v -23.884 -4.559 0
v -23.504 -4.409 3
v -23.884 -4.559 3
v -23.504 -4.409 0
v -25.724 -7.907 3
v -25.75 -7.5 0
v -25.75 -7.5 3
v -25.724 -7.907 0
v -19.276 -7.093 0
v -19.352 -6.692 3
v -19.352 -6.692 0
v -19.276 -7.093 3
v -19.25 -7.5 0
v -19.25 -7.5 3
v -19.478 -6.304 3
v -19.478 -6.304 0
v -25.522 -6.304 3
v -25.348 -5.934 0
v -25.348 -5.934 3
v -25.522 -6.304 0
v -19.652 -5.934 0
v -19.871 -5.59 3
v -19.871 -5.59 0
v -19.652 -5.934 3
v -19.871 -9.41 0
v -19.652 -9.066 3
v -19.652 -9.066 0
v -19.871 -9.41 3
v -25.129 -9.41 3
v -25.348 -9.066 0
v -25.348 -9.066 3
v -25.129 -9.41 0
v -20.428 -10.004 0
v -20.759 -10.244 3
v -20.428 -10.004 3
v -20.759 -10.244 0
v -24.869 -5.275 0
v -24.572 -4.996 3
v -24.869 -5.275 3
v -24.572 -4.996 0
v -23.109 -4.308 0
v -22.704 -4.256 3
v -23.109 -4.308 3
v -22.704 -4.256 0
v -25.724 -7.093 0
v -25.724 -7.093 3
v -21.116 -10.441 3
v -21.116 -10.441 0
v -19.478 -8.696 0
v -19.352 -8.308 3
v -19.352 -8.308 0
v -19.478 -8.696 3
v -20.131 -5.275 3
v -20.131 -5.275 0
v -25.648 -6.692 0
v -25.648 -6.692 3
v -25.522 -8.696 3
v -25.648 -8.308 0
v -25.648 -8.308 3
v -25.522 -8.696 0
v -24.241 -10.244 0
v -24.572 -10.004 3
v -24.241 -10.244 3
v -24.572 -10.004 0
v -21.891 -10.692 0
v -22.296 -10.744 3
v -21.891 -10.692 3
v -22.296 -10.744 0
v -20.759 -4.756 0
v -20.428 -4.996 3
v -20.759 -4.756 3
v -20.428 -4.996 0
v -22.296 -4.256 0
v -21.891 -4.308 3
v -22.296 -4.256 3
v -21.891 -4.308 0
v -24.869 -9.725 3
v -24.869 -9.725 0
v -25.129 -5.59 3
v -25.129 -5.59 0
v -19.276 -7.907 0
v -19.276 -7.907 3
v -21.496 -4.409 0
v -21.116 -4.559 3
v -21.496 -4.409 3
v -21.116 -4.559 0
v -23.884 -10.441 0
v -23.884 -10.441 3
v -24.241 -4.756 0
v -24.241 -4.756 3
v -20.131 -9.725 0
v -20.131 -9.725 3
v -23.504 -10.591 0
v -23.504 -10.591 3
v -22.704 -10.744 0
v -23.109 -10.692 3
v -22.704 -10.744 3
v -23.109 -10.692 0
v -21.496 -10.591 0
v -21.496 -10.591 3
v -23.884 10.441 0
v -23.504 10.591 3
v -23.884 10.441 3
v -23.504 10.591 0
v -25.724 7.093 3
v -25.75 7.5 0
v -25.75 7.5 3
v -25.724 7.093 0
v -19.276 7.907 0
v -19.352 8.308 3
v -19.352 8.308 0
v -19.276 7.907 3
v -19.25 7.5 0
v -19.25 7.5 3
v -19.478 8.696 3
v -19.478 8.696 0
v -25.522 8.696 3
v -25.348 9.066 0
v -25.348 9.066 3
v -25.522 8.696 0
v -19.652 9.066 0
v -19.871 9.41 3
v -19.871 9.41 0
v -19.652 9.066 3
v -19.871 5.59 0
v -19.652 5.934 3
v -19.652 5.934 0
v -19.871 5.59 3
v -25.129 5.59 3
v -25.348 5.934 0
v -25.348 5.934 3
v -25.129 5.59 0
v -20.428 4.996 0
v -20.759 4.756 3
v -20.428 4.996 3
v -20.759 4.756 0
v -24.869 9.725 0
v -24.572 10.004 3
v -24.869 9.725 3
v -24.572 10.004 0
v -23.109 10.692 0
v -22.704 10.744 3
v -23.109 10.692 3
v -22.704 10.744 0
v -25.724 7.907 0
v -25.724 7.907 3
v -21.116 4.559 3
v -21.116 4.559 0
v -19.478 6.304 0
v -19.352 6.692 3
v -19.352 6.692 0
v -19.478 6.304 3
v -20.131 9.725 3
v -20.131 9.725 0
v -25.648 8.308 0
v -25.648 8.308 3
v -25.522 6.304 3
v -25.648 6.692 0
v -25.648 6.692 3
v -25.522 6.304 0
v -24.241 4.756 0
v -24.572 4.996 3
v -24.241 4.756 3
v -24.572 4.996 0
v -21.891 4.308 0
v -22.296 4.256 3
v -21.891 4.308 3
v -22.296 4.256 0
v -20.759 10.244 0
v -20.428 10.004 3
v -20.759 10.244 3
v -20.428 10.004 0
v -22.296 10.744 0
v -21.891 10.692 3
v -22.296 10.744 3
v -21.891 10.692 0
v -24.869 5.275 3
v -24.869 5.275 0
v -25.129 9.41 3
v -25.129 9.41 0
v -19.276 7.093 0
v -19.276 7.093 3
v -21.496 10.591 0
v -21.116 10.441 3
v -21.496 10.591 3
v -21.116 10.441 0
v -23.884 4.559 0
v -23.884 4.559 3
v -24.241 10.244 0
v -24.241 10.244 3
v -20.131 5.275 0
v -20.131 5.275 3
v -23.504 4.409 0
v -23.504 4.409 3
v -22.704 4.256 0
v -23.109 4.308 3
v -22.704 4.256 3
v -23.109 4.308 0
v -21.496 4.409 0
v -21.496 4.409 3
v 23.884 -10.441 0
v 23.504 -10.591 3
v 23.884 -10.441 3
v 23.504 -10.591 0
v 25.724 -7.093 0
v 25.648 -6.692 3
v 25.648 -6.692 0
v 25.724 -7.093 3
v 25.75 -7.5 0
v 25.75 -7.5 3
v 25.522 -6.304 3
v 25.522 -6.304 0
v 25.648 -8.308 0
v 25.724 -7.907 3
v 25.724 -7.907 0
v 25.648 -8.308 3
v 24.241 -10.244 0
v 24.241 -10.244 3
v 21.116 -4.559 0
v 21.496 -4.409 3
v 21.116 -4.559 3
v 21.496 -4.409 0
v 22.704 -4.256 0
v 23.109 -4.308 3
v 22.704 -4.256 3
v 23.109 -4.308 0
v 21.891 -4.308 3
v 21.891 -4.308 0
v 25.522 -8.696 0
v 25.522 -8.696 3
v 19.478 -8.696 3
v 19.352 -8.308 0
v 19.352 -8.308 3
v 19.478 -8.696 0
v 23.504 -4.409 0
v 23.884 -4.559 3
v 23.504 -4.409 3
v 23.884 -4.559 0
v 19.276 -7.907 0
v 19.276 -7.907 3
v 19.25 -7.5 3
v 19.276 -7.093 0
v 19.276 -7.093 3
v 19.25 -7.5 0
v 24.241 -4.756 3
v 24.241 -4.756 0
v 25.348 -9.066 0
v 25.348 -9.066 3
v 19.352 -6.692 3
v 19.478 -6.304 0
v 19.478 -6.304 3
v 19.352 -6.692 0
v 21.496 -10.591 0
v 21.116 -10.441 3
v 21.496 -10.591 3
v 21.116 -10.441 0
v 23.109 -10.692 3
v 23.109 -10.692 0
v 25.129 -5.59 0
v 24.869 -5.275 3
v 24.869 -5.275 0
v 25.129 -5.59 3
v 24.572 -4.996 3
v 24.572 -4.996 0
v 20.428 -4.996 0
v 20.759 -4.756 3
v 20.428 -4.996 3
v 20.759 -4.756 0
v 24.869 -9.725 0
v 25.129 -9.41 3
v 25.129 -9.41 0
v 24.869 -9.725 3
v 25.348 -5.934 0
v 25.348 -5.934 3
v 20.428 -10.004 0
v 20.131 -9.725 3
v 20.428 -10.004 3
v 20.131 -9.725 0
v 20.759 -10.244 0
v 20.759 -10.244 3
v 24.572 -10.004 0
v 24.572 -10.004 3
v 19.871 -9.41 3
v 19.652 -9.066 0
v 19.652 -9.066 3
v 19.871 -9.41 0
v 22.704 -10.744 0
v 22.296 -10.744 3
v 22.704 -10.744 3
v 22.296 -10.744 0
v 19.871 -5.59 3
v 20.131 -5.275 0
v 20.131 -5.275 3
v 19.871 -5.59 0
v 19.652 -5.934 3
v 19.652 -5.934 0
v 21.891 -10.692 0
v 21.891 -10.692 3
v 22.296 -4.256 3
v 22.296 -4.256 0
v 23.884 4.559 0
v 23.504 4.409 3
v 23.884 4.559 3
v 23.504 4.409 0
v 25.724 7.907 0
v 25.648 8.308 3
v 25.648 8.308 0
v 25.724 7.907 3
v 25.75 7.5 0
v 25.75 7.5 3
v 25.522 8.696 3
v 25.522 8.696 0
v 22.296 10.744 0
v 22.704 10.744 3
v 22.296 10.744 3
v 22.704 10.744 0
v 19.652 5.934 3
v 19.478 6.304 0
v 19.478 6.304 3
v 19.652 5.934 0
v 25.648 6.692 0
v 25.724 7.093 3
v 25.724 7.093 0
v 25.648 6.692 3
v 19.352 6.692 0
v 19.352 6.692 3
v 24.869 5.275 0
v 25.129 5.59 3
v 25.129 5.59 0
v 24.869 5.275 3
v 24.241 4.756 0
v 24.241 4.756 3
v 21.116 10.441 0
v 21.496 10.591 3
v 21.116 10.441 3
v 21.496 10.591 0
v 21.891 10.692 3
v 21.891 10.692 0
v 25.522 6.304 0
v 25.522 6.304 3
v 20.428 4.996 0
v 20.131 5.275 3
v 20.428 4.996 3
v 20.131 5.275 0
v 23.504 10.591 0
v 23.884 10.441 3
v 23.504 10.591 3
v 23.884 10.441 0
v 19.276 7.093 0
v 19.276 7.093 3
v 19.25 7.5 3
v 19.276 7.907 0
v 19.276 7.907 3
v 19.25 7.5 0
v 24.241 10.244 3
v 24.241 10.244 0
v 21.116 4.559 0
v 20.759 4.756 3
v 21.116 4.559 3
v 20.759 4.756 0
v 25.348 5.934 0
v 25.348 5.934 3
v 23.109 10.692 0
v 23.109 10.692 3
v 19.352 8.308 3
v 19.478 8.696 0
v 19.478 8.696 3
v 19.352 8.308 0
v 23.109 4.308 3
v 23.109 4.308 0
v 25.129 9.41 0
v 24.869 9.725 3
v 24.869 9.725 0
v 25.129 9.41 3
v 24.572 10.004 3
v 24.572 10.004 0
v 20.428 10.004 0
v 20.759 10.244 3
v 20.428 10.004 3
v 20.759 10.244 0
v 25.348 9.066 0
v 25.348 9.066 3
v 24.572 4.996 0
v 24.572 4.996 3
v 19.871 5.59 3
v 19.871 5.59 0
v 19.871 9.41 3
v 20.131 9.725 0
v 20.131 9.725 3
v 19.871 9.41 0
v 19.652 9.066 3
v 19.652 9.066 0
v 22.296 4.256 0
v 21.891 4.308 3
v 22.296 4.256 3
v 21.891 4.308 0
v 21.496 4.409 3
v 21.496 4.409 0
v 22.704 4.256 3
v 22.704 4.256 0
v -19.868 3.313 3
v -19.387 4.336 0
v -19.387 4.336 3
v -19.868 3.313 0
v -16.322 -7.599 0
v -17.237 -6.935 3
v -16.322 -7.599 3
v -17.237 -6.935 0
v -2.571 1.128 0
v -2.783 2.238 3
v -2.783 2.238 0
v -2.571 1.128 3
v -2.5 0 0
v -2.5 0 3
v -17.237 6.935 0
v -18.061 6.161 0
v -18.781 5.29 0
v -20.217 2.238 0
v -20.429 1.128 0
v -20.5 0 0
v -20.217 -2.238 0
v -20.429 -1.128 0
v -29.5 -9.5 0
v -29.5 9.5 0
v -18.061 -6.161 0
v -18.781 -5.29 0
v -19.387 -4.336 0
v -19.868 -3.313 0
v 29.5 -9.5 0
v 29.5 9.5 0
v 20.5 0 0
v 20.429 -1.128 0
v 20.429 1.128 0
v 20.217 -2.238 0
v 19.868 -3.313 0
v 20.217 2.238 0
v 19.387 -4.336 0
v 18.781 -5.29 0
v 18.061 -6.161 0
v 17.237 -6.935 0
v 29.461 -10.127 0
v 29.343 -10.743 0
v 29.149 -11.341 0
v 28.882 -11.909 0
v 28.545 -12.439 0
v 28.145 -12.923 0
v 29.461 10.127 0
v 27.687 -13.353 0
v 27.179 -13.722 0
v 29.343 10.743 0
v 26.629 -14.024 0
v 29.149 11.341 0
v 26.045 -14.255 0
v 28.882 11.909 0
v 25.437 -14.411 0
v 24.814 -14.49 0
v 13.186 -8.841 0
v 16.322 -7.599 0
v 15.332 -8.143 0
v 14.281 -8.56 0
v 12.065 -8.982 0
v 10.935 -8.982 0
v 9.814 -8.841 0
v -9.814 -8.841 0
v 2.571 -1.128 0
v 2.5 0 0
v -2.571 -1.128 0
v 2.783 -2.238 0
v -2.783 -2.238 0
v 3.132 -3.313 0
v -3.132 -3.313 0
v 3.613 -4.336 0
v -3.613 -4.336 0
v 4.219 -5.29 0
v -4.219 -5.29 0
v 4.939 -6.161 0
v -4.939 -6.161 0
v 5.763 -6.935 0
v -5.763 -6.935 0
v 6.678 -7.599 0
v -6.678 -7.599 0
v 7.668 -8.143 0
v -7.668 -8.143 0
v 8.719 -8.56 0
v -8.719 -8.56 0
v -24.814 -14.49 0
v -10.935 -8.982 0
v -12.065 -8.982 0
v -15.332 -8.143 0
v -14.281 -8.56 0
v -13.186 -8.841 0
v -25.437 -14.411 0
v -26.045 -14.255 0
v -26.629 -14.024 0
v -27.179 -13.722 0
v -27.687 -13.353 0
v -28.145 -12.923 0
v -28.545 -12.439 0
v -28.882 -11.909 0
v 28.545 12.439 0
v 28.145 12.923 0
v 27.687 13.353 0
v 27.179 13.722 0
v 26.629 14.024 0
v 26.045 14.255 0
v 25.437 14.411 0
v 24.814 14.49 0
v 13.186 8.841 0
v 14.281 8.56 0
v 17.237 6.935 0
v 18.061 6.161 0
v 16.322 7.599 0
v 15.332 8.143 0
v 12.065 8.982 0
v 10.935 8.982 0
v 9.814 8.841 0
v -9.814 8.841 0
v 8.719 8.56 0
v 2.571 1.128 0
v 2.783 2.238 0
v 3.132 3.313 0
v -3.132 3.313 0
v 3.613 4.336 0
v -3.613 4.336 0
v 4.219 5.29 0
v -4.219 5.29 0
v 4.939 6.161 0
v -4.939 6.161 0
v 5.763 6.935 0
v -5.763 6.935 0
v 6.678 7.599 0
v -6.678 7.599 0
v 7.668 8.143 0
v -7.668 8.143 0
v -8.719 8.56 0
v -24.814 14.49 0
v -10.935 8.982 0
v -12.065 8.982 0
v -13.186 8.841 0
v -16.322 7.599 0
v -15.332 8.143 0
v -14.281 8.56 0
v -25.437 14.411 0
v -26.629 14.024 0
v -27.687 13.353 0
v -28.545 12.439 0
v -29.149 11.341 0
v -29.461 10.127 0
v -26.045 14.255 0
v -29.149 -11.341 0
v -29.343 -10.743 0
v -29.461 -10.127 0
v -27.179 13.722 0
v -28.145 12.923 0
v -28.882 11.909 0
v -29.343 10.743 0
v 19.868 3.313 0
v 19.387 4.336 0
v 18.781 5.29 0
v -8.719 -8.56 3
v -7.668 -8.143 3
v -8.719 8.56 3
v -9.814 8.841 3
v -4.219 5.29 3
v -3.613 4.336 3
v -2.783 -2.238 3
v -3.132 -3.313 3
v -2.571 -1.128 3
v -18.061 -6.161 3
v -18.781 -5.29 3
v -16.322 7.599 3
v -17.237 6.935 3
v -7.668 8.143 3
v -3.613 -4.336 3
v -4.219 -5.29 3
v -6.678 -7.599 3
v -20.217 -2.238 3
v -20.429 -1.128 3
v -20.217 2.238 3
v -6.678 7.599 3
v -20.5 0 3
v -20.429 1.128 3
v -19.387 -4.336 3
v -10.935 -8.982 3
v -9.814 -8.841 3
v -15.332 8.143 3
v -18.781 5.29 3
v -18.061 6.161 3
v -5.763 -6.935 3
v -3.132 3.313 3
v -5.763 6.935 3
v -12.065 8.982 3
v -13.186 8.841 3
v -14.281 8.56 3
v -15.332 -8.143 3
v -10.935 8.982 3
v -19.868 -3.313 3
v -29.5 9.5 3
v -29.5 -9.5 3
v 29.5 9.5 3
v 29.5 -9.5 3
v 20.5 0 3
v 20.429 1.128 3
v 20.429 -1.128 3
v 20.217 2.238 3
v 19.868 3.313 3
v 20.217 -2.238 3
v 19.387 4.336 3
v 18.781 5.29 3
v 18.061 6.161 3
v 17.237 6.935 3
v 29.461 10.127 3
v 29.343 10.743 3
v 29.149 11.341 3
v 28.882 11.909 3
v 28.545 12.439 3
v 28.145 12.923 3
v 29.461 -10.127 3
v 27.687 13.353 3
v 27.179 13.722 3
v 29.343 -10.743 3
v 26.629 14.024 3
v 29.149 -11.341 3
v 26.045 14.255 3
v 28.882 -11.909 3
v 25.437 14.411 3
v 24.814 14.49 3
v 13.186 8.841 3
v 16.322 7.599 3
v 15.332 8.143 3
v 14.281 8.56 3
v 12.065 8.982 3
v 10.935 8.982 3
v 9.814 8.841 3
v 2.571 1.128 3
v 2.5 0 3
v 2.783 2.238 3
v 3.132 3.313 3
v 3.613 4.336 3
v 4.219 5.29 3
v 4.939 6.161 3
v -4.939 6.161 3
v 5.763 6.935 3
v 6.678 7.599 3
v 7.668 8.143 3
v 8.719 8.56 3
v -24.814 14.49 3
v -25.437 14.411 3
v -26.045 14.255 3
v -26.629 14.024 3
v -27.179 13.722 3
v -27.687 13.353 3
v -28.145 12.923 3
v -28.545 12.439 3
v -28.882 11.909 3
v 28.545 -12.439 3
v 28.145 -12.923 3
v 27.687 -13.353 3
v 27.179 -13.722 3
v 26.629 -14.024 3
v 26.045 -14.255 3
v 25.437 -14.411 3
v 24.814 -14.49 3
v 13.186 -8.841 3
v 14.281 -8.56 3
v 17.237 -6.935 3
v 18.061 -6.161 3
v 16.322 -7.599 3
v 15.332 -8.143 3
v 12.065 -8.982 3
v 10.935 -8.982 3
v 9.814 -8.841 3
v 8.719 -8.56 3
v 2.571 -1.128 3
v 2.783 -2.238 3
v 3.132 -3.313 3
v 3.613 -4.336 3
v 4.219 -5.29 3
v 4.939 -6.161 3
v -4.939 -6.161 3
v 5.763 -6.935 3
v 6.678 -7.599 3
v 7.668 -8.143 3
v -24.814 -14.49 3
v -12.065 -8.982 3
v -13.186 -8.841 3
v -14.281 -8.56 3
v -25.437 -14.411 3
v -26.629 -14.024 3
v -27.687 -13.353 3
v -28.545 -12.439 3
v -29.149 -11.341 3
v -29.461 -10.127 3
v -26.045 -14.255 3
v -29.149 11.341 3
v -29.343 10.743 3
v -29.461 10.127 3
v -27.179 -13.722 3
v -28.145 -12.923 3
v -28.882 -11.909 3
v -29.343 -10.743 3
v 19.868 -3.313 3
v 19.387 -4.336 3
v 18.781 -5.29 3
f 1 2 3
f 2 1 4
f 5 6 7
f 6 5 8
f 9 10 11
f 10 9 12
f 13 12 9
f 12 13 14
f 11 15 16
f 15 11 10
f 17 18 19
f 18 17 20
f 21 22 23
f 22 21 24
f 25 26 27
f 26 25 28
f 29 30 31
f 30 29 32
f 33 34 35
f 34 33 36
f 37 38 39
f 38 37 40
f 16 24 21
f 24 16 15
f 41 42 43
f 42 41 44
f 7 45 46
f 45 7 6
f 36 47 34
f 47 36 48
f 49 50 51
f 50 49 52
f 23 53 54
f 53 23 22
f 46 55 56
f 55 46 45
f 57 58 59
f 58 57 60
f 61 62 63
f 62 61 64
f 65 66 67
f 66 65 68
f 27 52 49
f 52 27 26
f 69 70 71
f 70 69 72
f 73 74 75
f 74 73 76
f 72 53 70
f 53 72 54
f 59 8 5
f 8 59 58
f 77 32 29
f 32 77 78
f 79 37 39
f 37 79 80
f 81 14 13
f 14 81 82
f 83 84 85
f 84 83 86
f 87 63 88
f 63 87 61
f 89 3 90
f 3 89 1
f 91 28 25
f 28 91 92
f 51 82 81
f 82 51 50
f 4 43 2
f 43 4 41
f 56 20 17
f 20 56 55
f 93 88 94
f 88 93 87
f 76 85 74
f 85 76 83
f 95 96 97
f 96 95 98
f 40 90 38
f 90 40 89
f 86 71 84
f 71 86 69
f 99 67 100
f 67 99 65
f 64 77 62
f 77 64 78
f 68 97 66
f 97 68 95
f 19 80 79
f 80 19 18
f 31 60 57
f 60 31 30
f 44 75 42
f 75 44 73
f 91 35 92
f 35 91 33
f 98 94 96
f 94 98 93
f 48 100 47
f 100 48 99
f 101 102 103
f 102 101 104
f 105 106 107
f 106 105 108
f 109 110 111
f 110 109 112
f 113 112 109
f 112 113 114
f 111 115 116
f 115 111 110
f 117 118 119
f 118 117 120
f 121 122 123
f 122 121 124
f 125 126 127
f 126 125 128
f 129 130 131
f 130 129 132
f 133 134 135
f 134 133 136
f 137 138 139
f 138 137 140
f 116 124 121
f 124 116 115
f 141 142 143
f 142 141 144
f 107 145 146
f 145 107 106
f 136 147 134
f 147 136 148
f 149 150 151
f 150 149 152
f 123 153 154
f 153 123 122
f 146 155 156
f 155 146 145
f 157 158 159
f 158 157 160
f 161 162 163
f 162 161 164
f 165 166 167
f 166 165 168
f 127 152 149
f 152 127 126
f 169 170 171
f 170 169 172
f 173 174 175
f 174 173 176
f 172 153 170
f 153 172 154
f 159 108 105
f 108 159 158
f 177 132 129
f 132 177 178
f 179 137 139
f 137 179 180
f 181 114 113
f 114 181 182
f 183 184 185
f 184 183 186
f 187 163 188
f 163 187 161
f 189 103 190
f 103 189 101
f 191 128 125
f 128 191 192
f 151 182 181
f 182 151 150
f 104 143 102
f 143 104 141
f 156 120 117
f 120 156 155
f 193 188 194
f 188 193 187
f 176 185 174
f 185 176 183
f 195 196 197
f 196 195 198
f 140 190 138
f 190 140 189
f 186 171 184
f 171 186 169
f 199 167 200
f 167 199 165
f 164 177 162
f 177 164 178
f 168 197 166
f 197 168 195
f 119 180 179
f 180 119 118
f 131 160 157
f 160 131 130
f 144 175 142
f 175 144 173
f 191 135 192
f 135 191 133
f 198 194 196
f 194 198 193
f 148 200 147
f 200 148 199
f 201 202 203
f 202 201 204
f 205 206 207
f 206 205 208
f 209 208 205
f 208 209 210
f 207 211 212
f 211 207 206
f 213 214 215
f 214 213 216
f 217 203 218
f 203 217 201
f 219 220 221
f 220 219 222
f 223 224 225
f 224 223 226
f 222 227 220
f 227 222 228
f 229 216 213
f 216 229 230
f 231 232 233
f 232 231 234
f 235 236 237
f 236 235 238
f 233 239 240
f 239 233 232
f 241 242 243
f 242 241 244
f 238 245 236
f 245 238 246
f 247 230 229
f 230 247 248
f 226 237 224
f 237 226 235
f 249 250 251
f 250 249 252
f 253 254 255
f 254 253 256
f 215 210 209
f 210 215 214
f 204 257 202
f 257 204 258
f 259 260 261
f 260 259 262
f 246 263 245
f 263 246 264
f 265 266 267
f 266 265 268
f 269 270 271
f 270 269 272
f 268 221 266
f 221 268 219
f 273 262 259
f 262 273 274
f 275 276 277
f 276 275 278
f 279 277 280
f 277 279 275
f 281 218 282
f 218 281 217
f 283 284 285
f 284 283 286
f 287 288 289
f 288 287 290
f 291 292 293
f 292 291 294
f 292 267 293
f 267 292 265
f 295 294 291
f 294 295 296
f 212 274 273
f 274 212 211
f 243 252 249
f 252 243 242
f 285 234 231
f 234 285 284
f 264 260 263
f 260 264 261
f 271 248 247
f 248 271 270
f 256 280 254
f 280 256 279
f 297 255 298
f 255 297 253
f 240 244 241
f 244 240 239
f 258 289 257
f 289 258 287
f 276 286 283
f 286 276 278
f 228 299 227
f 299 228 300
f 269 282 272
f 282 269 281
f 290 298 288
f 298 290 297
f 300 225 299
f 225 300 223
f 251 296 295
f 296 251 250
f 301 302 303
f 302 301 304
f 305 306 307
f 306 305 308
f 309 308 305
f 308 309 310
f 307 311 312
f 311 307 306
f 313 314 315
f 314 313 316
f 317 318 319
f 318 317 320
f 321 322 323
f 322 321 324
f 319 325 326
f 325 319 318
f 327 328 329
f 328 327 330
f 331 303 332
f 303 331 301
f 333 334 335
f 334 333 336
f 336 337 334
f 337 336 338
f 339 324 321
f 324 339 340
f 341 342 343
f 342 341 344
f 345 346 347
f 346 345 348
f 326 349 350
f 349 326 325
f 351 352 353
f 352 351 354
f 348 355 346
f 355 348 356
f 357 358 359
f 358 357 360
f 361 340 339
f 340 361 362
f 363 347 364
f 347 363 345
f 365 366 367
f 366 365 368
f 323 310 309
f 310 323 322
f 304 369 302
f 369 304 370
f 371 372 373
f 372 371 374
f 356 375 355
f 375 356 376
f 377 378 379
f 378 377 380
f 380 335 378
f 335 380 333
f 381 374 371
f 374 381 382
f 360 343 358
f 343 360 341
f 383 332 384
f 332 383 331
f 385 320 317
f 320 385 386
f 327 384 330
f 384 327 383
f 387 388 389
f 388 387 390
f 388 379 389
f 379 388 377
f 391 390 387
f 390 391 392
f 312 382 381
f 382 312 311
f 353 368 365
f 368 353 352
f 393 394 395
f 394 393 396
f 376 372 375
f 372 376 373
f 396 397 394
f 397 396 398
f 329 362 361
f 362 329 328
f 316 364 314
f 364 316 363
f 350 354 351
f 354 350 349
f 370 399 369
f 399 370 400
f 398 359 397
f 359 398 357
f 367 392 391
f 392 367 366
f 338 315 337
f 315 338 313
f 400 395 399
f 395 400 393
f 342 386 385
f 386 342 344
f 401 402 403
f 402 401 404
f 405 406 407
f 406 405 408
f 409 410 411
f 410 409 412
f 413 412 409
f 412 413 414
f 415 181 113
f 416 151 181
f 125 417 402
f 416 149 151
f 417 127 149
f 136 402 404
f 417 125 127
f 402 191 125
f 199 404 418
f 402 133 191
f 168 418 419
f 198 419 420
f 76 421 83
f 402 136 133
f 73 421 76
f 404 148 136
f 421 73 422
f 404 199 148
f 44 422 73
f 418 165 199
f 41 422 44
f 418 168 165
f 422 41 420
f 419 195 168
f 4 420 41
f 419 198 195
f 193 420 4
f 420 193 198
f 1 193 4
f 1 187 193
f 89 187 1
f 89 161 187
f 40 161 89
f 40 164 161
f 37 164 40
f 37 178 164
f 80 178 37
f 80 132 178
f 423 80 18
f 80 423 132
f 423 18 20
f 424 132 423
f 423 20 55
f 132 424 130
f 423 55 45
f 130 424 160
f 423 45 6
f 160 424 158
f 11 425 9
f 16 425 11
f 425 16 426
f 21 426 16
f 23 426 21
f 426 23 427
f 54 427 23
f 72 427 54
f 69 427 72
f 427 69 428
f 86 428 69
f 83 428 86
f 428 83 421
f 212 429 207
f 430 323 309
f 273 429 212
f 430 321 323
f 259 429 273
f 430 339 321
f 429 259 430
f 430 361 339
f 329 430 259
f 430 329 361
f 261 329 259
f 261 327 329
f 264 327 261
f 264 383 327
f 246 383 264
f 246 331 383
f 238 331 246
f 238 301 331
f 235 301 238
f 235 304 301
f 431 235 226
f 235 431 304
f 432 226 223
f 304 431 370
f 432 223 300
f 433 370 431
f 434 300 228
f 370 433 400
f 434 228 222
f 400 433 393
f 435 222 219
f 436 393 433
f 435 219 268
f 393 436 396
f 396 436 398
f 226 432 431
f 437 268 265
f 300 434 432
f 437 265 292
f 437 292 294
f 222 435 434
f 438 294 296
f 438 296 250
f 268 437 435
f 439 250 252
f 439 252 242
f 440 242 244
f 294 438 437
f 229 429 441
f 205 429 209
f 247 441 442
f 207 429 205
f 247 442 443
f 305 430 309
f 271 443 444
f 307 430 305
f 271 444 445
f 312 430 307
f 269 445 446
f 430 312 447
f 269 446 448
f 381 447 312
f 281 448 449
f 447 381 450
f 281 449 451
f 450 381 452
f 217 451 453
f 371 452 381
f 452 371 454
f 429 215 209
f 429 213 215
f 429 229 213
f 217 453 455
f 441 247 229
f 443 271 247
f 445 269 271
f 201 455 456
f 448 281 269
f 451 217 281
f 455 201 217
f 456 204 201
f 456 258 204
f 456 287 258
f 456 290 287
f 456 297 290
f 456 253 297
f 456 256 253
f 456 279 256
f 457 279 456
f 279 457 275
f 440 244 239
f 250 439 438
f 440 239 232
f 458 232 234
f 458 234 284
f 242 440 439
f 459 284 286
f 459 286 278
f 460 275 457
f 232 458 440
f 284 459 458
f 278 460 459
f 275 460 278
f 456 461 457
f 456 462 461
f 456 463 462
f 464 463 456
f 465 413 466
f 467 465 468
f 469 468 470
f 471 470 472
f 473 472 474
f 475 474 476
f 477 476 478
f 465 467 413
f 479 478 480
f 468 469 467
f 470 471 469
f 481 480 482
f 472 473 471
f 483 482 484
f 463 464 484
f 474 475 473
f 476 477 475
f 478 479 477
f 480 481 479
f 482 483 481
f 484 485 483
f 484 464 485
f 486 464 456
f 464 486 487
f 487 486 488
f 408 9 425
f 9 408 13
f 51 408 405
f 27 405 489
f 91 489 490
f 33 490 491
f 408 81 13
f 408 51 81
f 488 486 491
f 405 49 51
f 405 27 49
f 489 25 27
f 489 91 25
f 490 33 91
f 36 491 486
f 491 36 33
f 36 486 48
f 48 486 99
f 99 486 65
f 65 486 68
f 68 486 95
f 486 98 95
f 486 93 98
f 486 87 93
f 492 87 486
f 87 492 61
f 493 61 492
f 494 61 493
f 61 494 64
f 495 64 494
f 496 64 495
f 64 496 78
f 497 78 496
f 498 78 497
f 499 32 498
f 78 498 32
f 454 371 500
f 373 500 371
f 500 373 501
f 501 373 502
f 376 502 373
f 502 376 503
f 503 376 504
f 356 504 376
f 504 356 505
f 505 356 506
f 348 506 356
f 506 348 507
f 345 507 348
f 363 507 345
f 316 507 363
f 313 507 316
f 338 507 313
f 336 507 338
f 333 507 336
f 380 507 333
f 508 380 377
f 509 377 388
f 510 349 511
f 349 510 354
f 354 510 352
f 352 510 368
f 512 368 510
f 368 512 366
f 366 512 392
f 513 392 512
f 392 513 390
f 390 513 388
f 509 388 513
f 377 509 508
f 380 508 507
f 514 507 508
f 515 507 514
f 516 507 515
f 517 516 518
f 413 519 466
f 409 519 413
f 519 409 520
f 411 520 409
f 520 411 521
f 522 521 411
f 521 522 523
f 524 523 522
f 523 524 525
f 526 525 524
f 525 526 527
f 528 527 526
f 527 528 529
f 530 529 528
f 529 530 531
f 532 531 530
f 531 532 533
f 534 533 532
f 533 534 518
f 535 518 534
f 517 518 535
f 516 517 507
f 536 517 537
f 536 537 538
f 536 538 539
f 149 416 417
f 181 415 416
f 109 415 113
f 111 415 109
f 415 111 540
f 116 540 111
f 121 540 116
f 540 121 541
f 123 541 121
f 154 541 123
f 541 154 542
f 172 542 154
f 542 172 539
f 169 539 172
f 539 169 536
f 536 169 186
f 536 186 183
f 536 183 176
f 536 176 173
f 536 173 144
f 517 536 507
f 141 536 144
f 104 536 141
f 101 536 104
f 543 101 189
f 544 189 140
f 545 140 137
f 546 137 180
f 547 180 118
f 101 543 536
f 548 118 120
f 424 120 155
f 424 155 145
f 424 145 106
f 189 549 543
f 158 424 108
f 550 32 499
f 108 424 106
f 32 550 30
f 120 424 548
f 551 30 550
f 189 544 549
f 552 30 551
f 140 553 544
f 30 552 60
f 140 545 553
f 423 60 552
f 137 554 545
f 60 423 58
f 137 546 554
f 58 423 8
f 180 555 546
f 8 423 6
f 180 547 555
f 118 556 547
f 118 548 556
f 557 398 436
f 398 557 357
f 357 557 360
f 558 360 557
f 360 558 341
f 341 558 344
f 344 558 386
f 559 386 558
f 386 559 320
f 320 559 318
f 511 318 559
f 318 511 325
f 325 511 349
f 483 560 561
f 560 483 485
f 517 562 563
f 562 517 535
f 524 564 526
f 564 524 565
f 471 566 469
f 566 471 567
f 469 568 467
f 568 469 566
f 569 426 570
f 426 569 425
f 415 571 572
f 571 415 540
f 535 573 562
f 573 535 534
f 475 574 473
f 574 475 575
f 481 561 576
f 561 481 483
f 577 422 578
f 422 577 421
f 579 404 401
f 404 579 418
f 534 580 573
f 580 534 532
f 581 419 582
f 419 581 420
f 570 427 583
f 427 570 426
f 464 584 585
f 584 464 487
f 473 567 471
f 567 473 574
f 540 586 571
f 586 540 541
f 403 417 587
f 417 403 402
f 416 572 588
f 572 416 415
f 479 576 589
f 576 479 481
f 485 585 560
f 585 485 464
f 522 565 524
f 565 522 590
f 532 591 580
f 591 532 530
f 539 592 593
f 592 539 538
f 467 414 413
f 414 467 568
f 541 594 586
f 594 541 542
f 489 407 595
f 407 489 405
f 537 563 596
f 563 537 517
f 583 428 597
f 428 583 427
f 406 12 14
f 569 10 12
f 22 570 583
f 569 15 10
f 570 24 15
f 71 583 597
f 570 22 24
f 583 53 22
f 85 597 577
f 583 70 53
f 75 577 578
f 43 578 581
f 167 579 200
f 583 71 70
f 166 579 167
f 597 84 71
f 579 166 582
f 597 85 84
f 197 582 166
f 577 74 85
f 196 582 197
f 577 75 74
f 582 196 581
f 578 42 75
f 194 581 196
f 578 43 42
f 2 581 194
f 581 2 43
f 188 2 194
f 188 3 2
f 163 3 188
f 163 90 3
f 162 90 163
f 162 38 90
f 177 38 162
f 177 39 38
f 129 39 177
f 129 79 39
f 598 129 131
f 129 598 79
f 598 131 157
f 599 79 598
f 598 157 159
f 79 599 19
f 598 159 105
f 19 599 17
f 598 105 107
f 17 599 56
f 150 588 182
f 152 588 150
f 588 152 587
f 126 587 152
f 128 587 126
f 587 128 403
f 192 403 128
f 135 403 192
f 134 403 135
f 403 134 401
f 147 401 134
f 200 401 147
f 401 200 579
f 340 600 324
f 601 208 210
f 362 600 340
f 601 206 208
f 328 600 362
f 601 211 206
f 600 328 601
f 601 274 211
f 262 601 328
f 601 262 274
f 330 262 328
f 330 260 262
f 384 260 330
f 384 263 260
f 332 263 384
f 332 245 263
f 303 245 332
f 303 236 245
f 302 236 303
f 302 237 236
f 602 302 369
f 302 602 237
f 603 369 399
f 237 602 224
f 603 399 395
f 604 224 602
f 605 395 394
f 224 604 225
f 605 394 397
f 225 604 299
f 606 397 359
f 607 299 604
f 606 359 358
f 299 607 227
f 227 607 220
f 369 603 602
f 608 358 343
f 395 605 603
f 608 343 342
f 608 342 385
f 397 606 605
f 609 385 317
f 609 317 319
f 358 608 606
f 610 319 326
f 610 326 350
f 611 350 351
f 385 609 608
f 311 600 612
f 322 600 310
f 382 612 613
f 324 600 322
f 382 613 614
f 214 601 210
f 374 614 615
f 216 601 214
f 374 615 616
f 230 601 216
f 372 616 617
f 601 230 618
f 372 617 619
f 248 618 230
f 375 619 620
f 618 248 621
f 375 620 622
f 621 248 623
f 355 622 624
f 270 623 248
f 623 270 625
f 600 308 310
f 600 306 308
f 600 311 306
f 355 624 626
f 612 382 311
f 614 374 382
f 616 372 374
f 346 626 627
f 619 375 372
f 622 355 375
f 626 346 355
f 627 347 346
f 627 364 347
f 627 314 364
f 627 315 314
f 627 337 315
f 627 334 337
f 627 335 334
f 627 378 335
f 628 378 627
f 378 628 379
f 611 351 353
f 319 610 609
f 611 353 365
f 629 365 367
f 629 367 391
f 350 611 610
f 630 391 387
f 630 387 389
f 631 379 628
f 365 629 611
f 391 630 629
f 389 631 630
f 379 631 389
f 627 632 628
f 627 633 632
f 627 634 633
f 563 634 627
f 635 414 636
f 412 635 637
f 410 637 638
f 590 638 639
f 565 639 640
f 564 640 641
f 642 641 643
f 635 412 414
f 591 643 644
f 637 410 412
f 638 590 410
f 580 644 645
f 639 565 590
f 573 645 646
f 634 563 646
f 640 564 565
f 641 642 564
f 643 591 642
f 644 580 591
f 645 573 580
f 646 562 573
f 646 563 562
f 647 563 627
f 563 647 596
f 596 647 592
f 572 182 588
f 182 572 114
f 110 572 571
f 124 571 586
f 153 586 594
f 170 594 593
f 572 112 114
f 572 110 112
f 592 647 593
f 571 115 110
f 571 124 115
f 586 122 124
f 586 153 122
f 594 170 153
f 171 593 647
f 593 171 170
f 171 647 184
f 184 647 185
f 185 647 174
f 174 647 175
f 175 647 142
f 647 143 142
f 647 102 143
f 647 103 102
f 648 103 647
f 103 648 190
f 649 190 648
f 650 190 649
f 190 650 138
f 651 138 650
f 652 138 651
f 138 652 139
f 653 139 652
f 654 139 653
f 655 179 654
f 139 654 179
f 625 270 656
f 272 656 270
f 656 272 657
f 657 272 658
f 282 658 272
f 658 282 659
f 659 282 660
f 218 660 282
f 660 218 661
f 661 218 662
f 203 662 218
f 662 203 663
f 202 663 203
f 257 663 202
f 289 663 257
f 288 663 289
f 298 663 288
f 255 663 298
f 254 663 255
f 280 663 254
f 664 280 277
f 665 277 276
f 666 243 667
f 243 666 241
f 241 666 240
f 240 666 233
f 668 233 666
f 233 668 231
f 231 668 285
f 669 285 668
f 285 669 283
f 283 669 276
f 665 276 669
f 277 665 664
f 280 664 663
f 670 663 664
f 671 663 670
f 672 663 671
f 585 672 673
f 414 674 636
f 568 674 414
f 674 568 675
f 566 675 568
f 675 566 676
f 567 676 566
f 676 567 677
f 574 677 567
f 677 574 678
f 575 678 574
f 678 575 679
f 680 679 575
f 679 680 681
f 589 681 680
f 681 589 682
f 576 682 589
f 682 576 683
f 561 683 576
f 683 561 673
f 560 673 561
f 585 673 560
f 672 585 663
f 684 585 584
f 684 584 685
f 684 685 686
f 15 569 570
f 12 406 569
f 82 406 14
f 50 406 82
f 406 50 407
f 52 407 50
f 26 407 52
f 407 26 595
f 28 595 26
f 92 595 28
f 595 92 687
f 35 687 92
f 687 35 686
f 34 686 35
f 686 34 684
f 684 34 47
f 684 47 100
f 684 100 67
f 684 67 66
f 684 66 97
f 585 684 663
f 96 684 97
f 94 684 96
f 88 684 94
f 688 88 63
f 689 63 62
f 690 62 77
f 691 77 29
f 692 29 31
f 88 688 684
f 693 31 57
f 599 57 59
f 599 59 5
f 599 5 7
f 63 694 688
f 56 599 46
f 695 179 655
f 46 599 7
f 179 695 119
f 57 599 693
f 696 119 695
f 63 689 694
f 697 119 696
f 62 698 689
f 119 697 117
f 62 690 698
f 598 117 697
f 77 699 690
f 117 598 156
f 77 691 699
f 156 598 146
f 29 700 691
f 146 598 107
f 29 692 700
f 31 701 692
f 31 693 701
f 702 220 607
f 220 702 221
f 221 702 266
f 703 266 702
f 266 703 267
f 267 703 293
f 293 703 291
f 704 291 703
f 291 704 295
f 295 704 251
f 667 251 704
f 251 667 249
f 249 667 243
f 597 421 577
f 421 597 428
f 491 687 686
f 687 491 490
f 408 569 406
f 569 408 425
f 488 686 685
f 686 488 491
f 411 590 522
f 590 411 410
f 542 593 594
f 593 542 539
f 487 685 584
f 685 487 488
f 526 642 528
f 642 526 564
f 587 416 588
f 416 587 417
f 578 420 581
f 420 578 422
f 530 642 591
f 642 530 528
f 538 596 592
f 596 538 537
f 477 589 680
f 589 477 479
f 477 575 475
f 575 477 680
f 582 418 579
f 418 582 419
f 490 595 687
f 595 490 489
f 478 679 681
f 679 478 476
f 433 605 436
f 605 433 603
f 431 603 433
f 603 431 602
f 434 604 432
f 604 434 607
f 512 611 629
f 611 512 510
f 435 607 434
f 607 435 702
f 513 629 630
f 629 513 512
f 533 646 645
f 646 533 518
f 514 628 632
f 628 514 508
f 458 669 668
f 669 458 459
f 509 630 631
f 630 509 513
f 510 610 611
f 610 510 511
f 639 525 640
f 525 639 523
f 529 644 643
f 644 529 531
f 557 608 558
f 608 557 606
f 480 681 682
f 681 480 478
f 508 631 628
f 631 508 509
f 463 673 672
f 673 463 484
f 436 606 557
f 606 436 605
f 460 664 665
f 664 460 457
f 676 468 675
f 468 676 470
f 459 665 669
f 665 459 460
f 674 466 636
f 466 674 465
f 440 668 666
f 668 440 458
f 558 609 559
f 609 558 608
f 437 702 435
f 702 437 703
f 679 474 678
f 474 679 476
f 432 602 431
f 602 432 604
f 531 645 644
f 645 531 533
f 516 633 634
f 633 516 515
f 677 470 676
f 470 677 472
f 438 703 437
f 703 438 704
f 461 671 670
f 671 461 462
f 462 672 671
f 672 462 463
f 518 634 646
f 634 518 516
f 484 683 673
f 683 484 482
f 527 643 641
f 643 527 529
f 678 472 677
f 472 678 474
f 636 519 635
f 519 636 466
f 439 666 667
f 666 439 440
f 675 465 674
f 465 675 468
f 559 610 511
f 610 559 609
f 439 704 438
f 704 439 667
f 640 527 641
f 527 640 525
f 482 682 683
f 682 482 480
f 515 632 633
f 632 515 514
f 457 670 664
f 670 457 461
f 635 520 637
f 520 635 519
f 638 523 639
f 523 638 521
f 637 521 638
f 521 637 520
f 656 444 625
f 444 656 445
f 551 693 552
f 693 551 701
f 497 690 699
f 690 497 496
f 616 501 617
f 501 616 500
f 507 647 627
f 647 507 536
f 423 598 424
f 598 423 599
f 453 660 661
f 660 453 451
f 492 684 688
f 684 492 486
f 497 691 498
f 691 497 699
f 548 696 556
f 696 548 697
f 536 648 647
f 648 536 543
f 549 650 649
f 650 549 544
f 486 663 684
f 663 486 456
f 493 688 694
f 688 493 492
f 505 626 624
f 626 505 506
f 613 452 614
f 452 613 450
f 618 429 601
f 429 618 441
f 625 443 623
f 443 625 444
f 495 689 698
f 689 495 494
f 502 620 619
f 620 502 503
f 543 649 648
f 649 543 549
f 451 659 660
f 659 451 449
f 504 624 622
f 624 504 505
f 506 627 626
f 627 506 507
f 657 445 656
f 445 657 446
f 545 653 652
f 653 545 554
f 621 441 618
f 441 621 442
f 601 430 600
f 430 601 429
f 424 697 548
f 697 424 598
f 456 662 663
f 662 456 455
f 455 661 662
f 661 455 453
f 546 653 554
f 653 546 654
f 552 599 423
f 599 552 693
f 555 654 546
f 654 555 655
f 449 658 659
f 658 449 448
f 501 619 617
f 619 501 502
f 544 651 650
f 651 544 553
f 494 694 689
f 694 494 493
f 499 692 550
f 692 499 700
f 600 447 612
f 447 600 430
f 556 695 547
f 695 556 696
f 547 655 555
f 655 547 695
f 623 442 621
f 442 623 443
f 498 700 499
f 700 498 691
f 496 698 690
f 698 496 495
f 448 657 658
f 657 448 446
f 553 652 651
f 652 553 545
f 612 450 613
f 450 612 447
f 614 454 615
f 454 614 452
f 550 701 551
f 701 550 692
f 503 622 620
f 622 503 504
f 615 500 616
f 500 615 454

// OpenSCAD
$fn = 50;


difference() {
	union() {
		hull() {
			translate(v = [-24.5000000000, 9.5000000000, 0]) {
				cylinder(h = 3, r = 5);
			}
			translate(v = [24.5000000000, 9.5000000000, 0]) {
				cylinder(h = 3, r = 5);
			}
			translate(v = [-24.5000000000, -9.5000000000, 0]) {
				cylinder(h = 3, r = 5);
			}
			translate(v = [24.5000000000, -9.5000000000, 0]) {
				cylinder(h = 3, r = 5);
			}
		}
	}
	union() {
		#translate(v = [-22.5000000000, -7.5000000000, -100.0000000000]) {
			cylinder(h = 200, r = 3.2500000000);
		}
		#translate(v = [-22.5000000000, 7.5000000000, -100.0000000000]) {
			cylinder(h = 200, r = 3.2500000000);
		}
		#translate(v = [22.5000000000, -7.5000000000, -100.0000000000]) {
			cylinder(h = 200, r = 3.2500000000);
		}
		#translate(v = [22.5000000000, 7.5000000000, -100.0000000000]) {
			cylinder(h = 200, r = 3.2500000000);
		}
		#translate(v = [-11.5000000000, 0, 0]) {
			cylinder(h = 3, r = 9.0000000000);
		}
		#translate(v = [11.5000000000, 0, 0]) {
			cylinder(h = 3, r = 9.0000000000);
		}
	}
}
